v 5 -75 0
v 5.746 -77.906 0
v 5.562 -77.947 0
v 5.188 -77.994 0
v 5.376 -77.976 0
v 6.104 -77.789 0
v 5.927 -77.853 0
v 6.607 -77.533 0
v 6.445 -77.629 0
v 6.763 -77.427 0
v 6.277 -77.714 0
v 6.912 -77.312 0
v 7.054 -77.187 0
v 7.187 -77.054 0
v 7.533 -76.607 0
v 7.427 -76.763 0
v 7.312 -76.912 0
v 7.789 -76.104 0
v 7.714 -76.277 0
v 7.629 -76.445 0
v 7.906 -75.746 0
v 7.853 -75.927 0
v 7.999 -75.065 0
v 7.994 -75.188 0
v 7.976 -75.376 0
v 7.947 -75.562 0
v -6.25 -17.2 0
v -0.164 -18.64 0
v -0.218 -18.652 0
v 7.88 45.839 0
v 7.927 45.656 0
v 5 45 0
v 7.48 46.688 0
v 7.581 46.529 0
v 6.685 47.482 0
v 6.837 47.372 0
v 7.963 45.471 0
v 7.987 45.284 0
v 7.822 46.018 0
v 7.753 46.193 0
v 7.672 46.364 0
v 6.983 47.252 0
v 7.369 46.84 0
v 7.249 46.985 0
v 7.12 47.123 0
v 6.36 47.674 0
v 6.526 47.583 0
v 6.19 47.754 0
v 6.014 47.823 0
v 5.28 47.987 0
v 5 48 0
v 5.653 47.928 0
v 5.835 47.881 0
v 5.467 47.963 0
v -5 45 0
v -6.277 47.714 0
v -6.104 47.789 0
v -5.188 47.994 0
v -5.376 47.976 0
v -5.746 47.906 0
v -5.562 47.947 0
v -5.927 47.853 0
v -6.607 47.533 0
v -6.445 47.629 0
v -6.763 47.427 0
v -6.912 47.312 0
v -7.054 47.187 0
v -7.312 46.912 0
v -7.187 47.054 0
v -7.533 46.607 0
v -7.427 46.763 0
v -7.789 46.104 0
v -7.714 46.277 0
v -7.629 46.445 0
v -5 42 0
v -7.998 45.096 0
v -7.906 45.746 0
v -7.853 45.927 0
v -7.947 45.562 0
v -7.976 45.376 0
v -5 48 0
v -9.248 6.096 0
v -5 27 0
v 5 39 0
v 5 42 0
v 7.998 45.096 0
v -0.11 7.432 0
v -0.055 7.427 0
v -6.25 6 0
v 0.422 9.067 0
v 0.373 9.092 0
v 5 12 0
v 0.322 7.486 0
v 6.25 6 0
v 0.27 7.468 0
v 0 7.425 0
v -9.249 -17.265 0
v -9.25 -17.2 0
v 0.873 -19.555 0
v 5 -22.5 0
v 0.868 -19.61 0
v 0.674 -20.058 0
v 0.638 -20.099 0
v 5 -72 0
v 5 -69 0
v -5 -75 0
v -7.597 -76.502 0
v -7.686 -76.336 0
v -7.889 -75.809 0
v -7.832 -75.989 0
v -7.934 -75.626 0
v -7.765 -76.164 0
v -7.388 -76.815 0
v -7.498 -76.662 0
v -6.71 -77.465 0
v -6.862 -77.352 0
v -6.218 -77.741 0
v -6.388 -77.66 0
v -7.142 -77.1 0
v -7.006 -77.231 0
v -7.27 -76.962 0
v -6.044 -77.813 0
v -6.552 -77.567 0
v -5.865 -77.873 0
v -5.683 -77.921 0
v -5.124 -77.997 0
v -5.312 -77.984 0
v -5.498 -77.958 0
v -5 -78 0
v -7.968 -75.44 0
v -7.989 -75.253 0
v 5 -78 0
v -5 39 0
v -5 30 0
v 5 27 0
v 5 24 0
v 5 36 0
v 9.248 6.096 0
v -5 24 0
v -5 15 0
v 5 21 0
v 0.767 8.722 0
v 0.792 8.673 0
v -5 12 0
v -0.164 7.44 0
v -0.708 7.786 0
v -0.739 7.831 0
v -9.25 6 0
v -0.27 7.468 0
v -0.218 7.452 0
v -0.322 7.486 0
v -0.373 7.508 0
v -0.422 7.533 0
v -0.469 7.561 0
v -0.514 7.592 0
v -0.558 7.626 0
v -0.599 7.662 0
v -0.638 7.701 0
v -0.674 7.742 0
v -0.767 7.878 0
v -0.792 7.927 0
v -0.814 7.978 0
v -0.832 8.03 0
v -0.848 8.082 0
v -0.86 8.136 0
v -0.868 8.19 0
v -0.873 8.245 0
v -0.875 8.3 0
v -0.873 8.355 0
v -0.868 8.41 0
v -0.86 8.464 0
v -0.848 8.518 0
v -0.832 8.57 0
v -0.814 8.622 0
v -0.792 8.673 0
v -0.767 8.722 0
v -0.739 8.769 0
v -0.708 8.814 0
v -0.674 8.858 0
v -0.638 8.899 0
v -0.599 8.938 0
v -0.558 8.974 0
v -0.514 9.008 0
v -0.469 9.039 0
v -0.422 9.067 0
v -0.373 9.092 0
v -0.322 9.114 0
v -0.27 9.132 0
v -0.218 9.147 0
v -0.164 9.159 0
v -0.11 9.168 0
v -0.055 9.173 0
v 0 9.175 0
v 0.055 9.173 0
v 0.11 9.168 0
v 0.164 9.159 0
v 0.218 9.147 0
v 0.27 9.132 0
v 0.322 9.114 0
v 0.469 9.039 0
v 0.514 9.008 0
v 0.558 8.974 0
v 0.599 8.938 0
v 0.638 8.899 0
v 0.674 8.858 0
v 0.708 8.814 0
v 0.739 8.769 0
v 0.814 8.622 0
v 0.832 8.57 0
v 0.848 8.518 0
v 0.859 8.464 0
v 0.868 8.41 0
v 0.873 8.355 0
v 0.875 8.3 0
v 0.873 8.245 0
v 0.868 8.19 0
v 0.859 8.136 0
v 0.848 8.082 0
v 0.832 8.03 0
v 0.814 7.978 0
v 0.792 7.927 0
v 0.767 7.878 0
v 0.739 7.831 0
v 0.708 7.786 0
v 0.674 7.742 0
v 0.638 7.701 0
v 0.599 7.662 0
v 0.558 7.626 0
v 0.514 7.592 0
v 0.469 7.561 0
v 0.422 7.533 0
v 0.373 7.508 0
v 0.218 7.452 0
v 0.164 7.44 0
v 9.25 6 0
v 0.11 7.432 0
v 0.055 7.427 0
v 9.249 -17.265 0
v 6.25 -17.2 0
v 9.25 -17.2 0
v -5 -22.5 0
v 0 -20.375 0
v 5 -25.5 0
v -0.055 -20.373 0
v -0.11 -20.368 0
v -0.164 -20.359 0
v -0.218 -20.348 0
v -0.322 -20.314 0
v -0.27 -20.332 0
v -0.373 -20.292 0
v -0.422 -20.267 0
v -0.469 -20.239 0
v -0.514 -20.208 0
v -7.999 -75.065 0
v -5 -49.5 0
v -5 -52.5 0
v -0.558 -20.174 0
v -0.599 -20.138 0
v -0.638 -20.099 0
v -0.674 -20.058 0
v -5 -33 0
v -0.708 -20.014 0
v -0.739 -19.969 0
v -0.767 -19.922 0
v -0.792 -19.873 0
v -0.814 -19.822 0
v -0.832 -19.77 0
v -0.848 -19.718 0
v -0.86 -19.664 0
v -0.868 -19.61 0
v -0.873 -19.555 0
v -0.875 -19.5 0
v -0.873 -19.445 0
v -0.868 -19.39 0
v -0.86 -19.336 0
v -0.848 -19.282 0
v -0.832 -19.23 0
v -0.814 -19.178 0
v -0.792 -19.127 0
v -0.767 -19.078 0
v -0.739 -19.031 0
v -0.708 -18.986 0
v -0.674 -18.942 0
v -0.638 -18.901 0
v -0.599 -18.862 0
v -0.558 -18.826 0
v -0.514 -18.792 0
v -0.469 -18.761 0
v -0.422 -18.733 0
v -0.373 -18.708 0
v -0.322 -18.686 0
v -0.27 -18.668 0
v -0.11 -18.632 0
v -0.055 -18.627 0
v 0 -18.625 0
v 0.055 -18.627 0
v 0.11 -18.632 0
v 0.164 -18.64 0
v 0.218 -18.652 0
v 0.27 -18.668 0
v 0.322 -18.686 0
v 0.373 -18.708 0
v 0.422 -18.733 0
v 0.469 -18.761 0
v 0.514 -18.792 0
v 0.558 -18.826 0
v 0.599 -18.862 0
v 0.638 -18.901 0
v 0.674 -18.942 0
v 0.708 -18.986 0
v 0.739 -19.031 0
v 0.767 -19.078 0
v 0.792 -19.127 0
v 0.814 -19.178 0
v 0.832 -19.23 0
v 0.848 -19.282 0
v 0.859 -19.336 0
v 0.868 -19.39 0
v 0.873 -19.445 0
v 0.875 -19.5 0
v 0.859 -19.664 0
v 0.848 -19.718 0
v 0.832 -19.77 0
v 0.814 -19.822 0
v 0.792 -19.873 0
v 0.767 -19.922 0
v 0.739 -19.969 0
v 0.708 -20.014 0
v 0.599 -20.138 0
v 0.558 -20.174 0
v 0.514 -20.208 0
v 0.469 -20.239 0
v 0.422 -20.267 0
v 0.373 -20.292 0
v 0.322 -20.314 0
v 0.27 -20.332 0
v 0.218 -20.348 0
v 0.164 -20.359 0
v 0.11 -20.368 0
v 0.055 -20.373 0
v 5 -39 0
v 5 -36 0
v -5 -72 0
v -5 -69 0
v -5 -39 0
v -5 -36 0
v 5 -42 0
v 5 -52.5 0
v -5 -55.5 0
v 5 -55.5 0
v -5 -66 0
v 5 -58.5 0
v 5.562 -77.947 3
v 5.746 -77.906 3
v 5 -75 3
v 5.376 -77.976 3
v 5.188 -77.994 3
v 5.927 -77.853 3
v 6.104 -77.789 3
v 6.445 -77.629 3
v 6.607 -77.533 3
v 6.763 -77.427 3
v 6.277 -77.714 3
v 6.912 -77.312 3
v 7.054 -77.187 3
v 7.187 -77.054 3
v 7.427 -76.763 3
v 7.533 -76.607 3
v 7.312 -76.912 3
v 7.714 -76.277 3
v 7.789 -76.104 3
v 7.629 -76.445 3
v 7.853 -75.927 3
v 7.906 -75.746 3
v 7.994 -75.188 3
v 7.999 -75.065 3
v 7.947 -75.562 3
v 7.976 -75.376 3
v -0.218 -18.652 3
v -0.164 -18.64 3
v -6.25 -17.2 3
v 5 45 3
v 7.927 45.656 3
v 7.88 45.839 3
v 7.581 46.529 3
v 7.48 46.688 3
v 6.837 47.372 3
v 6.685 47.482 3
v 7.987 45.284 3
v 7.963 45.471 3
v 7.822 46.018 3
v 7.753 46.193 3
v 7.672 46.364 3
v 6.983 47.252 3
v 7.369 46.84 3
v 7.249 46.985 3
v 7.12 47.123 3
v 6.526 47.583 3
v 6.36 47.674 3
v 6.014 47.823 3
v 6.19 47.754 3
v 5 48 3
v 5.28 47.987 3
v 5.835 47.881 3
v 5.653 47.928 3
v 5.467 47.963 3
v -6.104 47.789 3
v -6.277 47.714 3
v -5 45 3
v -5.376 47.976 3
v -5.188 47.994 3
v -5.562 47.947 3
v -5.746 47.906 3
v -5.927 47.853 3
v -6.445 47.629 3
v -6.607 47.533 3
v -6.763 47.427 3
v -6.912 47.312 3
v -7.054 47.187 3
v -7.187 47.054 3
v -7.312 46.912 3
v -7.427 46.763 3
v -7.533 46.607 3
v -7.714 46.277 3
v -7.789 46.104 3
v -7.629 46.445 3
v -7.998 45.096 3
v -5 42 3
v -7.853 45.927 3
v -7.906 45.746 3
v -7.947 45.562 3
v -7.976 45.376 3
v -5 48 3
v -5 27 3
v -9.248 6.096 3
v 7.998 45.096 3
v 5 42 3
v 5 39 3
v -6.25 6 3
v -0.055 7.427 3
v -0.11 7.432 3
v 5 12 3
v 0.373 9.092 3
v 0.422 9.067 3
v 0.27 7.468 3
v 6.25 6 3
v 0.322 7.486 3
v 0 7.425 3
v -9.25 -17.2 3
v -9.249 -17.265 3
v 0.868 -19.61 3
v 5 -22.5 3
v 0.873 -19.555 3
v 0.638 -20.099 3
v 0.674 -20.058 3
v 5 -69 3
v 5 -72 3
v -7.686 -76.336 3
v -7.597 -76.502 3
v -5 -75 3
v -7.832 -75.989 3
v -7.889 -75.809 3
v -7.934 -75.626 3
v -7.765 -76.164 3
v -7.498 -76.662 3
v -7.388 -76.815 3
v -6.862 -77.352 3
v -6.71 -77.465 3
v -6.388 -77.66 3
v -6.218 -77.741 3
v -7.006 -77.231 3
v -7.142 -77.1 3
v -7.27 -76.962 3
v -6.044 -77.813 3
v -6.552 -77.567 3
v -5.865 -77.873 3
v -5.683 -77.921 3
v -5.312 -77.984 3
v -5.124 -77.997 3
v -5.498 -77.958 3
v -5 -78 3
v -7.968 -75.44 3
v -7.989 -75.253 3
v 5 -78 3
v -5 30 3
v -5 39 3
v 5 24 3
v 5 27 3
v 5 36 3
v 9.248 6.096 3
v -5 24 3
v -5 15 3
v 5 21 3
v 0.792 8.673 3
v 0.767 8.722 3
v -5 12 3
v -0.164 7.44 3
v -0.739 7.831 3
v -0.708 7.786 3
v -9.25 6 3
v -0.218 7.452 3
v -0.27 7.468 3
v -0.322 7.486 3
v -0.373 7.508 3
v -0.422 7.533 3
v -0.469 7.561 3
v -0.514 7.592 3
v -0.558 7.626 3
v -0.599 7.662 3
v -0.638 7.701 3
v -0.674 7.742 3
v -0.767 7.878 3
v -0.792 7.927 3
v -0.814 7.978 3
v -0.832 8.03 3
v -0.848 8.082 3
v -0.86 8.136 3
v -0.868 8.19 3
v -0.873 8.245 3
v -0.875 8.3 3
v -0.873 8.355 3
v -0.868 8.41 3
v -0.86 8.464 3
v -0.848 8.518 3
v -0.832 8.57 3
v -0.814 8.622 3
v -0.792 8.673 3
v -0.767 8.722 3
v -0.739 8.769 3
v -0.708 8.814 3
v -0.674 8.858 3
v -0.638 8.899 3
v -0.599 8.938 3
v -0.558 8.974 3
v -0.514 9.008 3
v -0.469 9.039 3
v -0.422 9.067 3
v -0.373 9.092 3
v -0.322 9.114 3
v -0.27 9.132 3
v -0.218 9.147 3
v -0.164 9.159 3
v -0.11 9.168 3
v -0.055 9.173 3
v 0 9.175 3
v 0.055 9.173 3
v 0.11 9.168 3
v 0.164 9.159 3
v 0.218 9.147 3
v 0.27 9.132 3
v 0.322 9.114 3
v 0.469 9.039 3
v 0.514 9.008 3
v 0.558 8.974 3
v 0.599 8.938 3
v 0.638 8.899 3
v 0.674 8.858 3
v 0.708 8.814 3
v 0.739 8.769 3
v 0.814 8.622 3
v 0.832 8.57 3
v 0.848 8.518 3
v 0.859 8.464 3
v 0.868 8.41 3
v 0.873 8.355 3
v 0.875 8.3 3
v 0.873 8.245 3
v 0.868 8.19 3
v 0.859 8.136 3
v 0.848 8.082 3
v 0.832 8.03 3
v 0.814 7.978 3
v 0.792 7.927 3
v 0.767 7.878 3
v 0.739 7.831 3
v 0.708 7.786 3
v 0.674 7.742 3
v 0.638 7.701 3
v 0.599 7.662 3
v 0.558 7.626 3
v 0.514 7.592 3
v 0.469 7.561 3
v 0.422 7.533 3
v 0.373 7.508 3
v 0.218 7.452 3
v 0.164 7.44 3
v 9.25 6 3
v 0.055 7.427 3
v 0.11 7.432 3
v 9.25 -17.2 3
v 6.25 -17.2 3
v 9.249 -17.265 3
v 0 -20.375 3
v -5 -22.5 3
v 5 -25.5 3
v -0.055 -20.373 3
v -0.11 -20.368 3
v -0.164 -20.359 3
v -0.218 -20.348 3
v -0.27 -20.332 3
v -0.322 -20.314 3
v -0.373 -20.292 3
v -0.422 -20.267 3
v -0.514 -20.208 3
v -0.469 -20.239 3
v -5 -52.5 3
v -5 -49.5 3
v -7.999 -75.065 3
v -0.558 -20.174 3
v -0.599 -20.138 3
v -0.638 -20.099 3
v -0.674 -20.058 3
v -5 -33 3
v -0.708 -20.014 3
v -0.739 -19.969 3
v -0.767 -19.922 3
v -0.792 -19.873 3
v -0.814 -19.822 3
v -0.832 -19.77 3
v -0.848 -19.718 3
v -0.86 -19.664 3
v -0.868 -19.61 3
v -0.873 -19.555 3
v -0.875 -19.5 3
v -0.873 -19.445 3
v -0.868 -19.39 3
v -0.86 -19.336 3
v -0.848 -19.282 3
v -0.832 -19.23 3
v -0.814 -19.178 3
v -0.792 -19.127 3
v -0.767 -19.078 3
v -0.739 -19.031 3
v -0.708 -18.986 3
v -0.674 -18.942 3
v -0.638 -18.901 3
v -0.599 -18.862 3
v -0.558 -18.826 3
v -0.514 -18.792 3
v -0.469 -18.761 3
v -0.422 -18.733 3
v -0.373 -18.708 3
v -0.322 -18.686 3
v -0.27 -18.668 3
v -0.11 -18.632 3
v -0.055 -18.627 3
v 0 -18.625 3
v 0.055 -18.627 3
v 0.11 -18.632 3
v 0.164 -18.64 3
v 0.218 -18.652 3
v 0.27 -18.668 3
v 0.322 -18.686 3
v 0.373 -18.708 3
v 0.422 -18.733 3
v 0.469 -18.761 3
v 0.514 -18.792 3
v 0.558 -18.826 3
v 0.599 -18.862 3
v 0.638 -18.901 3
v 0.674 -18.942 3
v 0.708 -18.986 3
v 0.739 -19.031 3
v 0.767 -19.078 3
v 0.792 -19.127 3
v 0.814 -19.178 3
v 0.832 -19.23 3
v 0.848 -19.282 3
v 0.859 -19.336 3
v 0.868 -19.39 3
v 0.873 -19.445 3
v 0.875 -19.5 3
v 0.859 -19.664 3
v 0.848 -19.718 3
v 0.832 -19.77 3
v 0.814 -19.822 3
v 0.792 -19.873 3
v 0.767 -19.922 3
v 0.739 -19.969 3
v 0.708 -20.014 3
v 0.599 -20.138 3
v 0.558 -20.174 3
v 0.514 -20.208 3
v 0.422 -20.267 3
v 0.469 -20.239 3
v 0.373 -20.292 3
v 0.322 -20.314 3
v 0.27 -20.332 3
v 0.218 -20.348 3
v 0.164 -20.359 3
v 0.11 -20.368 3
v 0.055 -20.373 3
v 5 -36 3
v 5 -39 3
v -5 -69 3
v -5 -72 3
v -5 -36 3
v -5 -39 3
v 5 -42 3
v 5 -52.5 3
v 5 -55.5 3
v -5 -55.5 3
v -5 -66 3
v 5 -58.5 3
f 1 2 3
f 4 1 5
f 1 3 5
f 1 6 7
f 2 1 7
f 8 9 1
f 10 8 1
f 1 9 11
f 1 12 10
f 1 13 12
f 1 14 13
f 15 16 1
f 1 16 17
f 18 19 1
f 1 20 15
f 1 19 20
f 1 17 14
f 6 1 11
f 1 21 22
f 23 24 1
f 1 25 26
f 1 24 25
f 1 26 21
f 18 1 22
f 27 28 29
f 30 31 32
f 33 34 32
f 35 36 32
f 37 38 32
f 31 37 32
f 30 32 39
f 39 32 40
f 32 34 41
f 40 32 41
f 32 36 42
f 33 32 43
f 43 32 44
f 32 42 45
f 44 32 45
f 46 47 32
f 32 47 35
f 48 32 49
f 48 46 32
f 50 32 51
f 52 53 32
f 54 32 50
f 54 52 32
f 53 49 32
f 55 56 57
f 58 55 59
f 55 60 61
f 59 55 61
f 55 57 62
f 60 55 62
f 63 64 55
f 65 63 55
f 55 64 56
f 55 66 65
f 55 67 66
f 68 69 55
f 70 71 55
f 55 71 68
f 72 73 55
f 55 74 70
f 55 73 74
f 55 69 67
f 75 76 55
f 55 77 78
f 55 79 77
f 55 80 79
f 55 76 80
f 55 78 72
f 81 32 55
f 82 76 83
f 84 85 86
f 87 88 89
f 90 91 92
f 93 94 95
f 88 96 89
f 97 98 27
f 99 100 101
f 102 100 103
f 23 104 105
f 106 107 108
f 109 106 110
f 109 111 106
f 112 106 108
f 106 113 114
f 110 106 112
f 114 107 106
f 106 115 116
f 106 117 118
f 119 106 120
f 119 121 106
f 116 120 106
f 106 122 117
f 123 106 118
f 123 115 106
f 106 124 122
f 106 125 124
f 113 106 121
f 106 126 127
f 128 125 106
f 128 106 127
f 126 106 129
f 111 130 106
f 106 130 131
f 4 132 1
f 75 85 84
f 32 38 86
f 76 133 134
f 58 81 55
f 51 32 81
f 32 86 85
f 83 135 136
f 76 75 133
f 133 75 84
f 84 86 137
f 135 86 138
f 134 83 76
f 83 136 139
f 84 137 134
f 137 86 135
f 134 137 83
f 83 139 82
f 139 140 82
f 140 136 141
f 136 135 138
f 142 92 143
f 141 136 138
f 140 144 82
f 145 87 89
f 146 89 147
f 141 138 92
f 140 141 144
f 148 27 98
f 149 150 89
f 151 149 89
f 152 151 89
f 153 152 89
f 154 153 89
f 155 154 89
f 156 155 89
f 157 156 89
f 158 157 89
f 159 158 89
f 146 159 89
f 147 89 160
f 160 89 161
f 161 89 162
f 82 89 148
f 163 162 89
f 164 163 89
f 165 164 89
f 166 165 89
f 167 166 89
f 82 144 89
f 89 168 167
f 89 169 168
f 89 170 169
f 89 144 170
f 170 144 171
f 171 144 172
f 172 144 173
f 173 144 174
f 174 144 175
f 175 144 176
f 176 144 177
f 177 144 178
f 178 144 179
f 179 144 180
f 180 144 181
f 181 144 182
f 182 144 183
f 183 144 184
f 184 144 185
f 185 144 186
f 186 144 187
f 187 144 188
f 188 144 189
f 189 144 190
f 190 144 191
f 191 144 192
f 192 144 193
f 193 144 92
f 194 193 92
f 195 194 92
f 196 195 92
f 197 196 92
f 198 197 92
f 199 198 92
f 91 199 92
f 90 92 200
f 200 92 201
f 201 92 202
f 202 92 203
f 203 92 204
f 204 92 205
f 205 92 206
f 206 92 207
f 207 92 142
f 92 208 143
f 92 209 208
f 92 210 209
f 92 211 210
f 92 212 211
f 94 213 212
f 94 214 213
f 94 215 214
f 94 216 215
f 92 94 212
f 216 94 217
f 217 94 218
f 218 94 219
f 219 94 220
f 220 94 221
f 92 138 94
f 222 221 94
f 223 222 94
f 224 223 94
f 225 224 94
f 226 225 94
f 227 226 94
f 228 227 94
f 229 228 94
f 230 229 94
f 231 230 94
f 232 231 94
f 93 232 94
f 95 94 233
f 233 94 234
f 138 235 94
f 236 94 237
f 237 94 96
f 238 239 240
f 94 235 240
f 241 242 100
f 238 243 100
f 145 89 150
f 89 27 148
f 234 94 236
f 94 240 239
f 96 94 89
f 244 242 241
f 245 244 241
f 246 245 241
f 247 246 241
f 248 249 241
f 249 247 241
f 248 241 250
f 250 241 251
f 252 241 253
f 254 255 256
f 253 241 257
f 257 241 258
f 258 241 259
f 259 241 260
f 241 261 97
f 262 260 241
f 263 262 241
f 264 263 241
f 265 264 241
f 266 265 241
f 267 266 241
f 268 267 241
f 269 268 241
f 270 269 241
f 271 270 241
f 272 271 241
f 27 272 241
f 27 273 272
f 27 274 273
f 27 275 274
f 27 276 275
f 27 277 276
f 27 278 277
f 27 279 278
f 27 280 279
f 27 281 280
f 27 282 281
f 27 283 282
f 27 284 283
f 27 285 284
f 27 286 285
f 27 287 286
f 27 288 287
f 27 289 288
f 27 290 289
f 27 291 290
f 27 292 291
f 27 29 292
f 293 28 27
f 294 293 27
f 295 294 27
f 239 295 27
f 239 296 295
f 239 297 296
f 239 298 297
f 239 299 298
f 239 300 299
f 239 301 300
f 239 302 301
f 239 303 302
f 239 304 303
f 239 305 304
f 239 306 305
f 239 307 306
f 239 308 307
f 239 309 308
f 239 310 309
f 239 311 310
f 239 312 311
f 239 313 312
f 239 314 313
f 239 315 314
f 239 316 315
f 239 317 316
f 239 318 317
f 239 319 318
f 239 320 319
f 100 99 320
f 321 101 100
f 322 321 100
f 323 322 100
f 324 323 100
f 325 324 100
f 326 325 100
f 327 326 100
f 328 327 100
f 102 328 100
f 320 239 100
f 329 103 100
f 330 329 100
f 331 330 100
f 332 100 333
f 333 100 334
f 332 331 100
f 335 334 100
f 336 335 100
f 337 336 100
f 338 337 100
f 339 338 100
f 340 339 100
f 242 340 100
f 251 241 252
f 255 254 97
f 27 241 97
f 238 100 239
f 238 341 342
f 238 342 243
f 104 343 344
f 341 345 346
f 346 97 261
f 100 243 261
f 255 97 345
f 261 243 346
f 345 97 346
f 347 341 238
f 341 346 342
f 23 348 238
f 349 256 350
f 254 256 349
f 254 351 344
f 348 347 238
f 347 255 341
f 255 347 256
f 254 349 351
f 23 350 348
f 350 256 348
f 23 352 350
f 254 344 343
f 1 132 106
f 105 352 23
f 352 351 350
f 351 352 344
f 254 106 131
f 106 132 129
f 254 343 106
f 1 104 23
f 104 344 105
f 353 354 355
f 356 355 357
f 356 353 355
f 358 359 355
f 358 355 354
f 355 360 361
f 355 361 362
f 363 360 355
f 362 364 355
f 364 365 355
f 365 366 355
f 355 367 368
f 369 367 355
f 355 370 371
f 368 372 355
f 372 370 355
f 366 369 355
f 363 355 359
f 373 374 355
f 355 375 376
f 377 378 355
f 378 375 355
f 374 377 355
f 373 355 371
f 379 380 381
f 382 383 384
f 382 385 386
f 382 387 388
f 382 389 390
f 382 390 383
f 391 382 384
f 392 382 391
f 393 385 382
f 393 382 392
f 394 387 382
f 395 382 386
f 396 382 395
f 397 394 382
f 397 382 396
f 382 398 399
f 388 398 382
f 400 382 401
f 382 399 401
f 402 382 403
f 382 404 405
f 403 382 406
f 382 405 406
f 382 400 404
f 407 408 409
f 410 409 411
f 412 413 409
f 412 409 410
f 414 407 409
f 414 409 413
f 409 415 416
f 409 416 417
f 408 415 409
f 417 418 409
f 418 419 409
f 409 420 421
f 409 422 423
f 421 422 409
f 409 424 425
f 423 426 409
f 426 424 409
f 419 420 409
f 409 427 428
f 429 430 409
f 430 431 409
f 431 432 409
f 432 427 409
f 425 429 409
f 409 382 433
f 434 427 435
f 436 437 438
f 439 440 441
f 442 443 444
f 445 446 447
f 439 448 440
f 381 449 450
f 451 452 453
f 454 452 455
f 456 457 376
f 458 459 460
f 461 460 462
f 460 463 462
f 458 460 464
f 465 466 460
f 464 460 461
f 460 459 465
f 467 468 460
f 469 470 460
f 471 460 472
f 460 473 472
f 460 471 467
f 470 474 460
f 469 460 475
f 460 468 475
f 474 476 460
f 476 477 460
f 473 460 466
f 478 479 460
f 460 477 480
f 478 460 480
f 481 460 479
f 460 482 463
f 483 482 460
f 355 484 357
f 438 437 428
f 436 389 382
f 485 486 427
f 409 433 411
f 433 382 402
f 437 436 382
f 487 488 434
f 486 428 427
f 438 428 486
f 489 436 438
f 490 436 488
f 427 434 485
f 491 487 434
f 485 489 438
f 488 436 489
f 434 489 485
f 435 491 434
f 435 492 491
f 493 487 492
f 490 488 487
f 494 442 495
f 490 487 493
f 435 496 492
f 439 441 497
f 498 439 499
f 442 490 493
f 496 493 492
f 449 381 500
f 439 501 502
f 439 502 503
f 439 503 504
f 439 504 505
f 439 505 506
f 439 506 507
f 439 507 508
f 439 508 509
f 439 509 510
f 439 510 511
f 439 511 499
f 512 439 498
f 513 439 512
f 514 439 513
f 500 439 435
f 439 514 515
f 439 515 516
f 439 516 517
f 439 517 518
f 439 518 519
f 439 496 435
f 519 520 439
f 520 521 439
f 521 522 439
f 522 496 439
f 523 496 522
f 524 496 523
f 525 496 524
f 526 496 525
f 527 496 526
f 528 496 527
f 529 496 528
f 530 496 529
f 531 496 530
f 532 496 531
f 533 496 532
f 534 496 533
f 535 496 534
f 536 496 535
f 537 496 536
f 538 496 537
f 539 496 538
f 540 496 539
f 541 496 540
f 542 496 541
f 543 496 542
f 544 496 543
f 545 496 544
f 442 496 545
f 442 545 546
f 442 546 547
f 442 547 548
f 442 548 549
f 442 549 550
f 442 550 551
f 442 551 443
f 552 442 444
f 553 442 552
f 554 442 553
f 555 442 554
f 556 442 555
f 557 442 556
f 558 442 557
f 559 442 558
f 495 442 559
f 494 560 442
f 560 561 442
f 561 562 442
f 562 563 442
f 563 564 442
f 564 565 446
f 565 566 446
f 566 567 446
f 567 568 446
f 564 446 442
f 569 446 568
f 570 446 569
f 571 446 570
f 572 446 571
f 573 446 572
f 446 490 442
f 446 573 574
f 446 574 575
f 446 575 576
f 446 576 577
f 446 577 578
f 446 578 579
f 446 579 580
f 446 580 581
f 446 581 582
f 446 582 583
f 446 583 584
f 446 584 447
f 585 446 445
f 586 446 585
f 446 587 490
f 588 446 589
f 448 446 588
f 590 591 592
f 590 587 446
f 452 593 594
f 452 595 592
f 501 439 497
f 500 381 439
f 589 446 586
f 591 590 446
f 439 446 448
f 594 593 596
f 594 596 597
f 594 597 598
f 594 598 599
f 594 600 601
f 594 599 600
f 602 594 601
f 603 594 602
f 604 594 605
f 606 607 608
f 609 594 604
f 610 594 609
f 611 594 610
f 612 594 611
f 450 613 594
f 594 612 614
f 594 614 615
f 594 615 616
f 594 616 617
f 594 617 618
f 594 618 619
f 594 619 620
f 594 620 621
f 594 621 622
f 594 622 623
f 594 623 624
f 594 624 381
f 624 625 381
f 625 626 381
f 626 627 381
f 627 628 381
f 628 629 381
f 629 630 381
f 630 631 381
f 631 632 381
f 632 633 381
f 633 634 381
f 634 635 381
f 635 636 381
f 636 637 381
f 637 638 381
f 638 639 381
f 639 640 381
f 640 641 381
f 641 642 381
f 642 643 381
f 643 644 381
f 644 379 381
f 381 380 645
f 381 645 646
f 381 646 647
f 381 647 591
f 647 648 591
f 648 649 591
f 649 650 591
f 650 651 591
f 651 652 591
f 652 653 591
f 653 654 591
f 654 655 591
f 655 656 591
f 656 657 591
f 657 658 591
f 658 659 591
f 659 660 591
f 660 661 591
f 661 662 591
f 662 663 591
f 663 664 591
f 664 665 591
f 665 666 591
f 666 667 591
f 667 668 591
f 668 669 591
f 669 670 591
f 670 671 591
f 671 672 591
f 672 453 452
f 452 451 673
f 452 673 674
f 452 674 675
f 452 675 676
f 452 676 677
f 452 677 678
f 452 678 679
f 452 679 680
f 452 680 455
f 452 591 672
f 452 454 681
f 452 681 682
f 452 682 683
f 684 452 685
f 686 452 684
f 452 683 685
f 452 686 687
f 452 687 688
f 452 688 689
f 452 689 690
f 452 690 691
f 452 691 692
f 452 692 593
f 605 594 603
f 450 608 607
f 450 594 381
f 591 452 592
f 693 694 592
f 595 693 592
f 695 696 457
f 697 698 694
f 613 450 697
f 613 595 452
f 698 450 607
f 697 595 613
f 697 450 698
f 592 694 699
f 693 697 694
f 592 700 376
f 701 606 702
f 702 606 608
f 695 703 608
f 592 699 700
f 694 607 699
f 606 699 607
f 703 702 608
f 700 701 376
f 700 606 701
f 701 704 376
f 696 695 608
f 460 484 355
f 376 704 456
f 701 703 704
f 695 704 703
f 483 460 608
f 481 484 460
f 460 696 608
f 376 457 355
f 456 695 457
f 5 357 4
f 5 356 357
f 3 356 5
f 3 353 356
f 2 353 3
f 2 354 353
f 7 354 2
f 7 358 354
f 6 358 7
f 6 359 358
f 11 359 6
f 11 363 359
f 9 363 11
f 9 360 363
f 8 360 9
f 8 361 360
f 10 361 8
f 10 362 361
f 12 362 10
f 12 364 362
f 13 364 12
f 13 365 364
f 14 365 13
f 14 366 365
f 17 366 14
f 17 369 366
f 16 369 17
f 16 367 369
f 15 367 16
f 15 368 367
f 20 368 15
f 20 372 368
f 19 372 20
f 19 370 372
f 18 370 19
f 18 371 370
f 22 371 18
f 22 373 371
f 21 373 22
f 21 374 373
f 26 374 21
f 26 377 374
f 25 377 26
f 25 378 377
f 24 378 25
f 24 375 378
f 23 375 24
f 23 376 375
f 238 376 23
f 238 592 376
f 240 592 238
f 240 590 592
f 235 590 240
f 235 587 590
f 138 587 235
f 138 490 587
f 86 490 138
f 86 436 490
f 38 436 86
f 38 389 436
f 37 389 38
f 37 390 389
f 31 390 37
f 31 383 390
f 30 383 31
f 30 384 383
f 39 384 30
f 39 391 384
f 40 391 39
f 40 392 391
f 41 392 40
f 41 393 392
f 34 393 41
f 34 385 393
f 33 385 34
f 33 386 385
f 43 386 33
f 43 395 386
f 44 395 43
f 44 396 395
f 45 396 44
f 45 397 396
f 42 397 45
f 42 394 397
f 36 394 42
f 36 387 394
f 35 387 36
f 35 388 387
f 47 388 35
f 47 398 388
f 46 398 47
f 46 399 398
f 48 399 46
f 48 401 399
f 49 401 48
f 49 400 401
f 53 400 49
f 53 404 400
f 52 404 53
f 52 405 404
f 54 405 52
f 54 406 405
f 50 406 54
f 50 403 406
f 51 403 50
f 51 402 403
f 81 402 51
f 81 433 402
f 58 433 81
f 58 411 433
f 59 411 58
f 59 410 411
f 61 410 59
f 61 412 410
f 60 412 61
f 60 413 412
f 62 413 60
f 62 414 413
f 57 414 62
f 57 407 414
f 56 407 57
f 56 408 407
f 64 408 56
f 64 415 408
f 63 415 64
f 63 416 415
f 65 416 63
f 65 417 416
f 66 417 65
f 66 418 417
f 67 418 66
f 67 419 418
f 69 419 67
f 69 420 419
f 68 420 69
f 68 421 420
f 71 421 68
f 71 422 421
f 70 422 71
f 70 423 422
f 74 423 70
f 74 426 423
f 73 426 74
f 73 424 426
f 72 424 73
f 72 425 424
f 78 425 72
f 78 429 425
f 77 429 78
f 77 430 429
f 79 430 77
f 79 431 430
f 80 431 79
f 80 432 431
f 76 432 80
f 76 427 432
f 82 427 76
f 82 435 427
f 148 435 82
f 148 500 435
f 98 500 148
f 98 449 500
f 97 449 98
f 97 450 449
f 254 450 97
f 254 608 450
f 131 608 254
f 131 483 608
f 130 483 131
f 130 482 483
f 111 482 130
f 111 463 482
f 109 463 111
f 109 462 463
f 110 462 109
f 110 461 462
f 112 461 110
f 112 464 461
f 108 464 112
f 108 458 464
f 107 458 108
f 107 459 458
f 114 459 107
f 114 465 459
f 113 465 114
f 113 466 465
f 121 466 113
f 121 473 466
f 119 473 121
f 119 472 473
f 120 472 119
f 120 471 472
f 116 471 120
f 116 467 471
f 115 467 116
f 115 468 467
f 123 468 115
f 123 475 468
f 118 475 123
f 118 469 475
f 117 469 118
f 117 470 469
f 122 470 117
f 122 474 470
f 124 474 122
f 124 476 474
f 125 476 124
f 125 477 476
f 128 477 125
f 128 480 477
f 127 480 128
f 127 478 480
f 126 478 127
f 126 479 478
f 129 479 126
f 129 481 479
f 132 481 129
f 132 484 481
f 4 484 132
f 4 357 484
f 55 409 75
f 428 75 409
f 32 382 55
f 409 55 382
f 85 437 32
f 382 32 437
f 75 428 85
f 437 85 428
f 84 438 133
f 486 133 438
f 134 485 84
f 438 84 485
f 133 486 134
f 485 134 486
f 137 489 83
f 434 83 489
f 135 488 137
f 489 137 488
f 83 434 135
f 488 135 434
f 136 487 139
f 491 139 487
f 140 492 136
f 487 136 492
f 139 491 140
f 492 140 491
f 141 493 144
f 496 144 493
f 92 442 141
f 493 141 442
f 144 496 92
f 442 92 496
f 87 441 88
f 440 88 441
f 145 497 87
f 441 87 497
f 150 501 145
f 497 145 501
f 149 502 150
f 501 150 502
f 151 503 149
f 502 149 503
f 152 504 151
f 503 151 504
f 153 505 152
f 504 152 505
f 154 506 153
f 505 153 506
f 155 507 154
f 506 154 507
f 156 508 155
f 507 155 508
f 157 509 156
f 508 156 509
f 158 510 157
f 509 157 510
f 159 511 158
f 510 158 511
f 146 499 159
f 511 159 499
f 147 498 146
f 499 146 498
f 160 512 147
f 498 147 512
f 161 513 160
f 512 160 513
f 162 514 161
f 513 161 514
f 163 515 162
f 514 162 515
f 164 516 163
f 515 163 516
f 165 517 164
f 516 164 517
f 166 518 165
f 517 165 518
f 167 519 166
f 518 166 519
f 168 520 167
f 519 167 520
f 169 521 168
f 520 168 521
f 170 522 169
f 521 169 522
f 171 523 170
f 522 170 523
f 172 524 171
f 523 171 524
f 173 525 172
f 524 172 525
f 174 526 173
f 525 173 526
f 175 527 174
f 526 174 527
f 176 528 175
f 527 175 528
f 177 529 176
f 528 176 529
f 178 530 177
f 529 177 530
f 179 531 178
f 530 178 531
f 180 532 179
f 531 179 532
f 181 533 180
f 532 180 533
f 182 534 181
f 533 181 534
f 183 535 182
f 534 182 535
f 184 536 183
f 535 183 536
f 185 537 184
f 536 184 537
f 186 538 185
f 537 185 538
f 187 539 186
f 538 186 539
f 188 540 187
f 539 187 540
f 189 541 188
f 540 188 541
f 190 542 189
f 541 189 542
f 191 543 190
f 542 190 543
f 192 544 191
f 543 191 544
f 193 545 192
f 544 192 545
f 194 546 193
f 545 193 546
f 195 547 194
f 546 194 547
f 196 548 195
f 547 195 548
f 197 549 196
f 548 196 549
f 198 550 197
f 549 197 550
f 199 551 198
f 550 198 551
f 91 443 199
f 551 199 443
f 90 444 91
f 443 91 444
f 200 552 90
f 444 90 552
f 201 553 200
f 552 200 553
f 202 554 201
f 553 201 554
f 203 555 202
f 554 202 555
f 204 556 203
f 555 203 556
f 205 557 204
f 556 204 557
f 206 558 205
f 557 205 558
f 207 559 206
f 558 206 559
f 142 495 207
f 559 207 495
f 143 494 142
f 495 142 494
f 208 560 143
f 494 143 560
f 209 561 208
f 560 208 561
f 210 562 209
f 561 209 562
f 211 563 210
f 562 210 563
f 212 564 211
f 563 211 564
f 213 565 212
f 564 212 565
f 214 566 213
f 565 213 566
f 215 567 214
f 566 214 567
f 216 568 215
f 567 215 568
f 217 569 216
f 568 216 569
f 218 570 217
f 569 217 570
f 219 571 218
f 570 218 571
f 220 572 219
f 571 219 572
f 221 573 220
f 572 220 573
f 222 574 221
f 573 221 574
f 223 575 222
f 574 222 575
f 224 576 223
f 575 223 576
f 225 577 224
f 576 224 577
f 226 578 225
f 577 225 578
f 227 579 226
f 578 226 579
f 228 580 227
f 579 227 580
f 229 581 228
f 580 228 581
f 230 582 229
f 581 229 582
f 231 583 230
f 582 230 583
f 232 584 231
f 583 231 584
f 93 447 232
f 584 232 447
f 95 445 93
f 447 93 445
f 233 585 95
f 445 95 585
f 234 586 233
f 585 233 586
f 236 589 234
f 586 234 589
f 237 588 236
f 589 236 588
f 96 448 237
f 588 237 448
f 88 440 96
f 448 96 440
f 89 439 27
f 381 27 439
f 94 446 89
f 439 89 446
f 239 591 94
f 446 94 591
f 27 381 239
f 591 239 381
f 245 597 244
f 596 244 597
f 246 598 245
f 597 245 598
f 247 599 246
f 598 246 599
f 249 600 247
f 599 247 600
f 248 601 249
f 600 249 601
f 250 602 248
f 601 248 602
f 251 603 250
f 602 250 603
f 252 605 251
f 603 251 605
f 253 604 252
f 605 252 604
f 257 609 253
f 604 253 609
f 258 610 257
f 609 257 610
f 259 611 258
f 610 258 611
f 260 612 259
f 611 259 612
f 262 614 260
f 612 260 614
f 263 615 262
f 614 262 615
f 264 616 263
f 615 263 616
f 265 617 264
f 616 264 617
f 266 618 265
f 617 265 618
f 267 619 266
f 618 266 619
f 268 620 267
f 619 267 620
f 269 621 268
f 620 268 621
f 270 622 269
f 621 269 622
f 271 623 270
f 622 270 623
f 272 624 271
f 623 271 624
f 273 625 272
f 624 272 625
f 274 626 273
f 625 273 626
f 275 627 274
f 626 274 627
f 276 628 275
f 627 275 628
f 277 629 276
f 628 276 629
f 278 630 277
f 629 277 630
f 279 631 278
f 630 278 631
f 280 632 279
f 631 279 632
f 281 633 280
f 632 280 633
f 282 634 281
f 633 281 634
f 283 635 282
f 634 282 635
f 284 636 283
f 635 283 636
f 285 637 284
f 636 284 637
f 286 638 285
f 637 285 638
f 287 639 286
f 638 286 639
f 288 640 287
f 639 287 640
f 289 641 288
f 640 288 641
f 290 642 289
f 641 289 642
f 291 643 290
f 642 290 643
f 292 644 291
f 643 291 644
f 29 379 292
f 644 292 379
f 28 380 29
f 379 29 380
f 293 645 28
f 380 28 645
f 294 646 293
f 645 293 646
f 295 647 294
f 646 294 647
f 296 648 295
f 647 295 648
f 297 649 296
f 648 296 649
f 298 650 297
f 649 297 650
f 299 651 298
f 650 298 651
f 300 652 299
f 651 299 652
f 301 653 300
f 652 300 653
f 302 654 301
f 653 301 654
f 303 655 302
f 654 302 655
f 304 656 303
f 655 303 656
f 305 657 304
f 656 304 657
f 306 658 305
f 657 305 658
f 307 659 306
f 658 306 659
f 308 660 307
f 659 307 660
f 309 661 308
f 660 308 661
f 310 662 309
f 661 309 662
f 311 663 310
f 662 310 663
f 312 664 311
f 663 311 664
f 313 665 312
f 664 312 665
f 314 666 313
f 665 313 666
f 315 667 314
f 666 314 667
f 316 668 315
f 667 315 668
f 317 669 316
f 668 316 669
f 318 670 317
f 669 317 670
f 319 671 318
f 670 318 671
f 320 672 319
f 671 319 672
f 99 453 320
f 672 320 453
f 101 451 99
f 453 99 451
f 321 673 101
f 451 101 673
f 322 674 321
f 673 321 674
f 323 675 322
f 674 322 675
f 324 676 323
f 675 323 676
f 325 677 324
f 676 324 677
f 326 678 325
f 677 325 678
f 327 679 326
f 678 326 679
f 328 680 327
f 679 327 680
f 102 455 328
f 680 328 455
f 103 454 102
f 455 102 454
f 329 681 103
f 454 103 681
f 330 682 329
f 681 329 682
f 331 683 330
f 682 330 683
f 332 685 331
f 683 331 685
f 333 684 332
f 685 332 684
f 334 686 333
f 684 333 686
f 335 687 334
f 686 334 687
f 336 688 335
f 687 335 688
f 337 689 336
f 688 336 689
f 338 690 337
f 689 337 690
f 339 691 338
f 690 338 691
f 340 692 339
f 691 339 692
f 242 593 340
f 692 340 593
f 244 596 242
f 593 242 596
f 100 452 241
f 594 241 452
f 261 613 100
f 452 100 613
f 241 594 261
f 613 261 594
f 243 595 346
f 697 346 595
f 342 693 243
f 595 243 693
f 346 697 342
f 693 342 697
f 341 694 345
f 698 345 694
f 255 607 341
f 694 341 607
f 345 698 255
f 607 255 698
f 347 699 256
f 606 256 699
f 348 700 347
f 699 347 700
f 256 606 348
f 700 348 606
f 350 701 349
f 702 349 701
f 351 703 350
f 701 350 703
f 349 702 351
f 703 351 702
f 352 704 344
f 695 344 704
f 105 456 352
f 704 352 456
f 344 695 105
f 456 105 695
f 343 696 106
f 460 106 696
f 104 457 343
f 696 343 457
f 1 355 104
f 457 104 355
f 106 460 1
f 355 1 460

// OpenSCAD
// file: gear.scad
// TODO: Screw mount is a bit too thick, cut another hole in it about halfway through

$fn = 64;

gear_diam = 90;
gear_thickness = 4;
gear_spur_depth = 2;
gear_rim_width = 3;

function outer_diam(d, fn=$fn) = 1/cos(180/fn) * d;

// Servo head
module servo_arm() {
  tip_diameter = 3.75;
  base_diameter = 7;
  short_arm_length = 16.0;
  long_arm_length = 18.6;
  bar_length = 16.8;
  arm_thickness = 1.75;
  base_thickness = 4;
  screw_height = base_thickness + gear_thickness;
  screw_diam = 2.4;

  // origin is center of arm attachment (screw center, without base)
  union() {
    linear_extrude(height=arm_thickness, center=true){
      union() {
        // arm and center
        hull() {
          circle(d=base_diameter);
          translate([long_arm_length - tip_diameter / 2, 0])
            circle(d=tip_diameter);
          translate([-(short_arm_length - tip_diameter / 2), 0])
            circle(d=tip_diameter);
        }

        // short bar across
        hull() {
          translate([0, bar_length / 2 - tip_diameter / 2])
            circle(d=tip_diameter);
          translate([0, -(bar_length / 2 - tip_diameter / 2)])
            circle(d=tip_diameter);
        }
      }
    }
    translate([0, 0, -base_thickness + arm_thickness / 2]) {
      cylinder(d=base_diameter, h=base_thickness);
      cylinder(d=outer_diam(screw_diam), h=screw_height);
    }
  }
}

module servo_mount_mold_box() {
  difference() {
    translate([0, 0, 0.25])
      cube([38, 20, 2], center=true);
    servo_arm();
  }
}

module half_circle_rim(inner, outer) {
  difference() {
    circle(d=outer);
    circle(d=inner);
    translate([0, -outer/2])
      square([outer/2, outer]);
  }
}

module gear() {
  outer_diam = gear_diam + 2 * gear_spur_depth;
  inner_diam = gear_diam - 2 * gear_rim_width;

  difference() {
    union() {
      // half moon rim
      difference() {
        rotate_extrude(angle=180) {
          translate([inner_diam / 2, 0, 0])
            difference() {
              w = gear_rim_width + gear_spur_depth;
              h = gear_thickness;
              rt = h/6;
              square([w, h]);
              polygon([[w, rt], [w, h - rt], [w - gear_spur_depth, h/2 + rt/2], [w - gear_spur_depth, h/2 - rt/2]]);
            }
        }

        // cut off second half, as angle = 180 does not work in this version of openscad
        linear_extrude(height=gear_thickness)
          translate([gear_rim_width / 2, -outer_diam/2])
            square([outer_diam / 2, outer_diam]);
      }

      linear_extrude(height=gear_thickness) {
        // box that fits the servo mount
        resize([20, 40], center=true) circle(d=1);

        for (angle = [0, 60, 120, 180])
          rotate([0, 0, angle])
            translate([-gear_rim_width / 2, 0])
              square([gear_rim_width, gear_diam/2]);
      }
    }


    // servo arm mount cutout
    translate([0, 0, 1.75/2])
      rotate([0, 0, 90])
        servo_arm();

    // cable tie cutouts
    for(x = [-1, 1])
      for(y = [-1, 1])
        translate([x * 6, y * 6, 0])
          cylinder(d=outer_diam(3), h=gear_thickness);
  }
}

//rotate([180, 0 ,0])
  gear();
// servo_mount_mold_box();
// main file
use <gear.scad>;

$fn = 100;

gear_diameter = 90;
body_length = 23.2;
body_width = 12.5;
body_height = 22.6;
mount_height = 2.8;
mount_offset = 21 - mount_height;
mount_length = 32.5;
gear_hood_diam = 12;
gear_hood_height = 5.7;
arm_spacing = 2.5;
mount_hole_diam = 1.75;
mount_hole_offset = (27.8 - body_length)/2;

module servo () {
  // origin is mounting point, center of gear attachment
  offset = [
    -(body_length - gear_hood_diam/2),
    -(body_width / 2),
    -(body_height + gear_hood_height + arm_spacing)
  ];

  translate(offset) {
    union() {
      cube([body_length, body_width, body_height]);
      translate([-(mount_length - body_length)/2, 0, mount_offset])
        cube([mount_length, body_width, mount_height]);
      translate([body_length - gear_hood_diam/2, body_width/2, body_height])
        cylinder(d=gear_hood_diam, h=gear_hood_height);
    }
  }
}

module example_gear_and_servo() {
  rotate([90, 0, 90]) {
    rotate([0, 0, 90])
      servo();
    gear();
  }
}

module servo_mount_cutout() {
  translate([-body_width/2, -(body_length - gear_hood_diam /2)]) {
    square([body_width, body_length]);
    translate([body_width/2, -mount_hole_offset])
      circle(d=mount_hole_diam);
    translate([body_width/2, body_length+mount_hole_offset])
      circle(d=mount_hole_diam);
  }
}

rim_width = 3;
stand_thickness = 3;
stand_height = 120;
stand_width = 10;

module triangle_cutouts(n=1, length = stand_width + rim_width) {
  l = length / 2 / n;
  for(i = [0:1:n-1]) {
    translate([-stand_width / 2, i * (l + 2 * rim_width)]) {
      polygon([
        [0, 0],
        [stand_width, 0],
        [stand_width, l]]);
      polygon([
        [0, rim_width],
        [stand_width, rim_width + l],
        [0, rim_width + l]]);
    }
  }
}

linear_extrude(height=stand_thickness){
  difference() {
    offset(r=rim_width) {
      hull() {
        servo_mount_cutout();
        translate([-stand_width/2, gear_diameter/2 - stand_height])
          square([stand_width, stand_height]);
      }
    }
    servo_mount_cutout();
    translate([-stand_width/2, gear_diameter/2 - rim_width])
      square([stand_width, stand_thickness]);
    translate([-stand_width/2, gear_diameter/2 - stand_height])
      square([stand_width, stand_thickness]);

    translate([0, gear_hood_diam]) {
      triangle_cutouts(n=2, length=gear_diameter / 2 - 2 * rim_width - stand_thickness);
    }

    translate([0, -(stand_height - gear_diameter / 2) + stand_thickness + rim_width]) {
      triangle_cutouts(n=3, length=stand_height - gear_diameter / 2 - 3 * rim_width - stand_thickness);
    }
  }
}
